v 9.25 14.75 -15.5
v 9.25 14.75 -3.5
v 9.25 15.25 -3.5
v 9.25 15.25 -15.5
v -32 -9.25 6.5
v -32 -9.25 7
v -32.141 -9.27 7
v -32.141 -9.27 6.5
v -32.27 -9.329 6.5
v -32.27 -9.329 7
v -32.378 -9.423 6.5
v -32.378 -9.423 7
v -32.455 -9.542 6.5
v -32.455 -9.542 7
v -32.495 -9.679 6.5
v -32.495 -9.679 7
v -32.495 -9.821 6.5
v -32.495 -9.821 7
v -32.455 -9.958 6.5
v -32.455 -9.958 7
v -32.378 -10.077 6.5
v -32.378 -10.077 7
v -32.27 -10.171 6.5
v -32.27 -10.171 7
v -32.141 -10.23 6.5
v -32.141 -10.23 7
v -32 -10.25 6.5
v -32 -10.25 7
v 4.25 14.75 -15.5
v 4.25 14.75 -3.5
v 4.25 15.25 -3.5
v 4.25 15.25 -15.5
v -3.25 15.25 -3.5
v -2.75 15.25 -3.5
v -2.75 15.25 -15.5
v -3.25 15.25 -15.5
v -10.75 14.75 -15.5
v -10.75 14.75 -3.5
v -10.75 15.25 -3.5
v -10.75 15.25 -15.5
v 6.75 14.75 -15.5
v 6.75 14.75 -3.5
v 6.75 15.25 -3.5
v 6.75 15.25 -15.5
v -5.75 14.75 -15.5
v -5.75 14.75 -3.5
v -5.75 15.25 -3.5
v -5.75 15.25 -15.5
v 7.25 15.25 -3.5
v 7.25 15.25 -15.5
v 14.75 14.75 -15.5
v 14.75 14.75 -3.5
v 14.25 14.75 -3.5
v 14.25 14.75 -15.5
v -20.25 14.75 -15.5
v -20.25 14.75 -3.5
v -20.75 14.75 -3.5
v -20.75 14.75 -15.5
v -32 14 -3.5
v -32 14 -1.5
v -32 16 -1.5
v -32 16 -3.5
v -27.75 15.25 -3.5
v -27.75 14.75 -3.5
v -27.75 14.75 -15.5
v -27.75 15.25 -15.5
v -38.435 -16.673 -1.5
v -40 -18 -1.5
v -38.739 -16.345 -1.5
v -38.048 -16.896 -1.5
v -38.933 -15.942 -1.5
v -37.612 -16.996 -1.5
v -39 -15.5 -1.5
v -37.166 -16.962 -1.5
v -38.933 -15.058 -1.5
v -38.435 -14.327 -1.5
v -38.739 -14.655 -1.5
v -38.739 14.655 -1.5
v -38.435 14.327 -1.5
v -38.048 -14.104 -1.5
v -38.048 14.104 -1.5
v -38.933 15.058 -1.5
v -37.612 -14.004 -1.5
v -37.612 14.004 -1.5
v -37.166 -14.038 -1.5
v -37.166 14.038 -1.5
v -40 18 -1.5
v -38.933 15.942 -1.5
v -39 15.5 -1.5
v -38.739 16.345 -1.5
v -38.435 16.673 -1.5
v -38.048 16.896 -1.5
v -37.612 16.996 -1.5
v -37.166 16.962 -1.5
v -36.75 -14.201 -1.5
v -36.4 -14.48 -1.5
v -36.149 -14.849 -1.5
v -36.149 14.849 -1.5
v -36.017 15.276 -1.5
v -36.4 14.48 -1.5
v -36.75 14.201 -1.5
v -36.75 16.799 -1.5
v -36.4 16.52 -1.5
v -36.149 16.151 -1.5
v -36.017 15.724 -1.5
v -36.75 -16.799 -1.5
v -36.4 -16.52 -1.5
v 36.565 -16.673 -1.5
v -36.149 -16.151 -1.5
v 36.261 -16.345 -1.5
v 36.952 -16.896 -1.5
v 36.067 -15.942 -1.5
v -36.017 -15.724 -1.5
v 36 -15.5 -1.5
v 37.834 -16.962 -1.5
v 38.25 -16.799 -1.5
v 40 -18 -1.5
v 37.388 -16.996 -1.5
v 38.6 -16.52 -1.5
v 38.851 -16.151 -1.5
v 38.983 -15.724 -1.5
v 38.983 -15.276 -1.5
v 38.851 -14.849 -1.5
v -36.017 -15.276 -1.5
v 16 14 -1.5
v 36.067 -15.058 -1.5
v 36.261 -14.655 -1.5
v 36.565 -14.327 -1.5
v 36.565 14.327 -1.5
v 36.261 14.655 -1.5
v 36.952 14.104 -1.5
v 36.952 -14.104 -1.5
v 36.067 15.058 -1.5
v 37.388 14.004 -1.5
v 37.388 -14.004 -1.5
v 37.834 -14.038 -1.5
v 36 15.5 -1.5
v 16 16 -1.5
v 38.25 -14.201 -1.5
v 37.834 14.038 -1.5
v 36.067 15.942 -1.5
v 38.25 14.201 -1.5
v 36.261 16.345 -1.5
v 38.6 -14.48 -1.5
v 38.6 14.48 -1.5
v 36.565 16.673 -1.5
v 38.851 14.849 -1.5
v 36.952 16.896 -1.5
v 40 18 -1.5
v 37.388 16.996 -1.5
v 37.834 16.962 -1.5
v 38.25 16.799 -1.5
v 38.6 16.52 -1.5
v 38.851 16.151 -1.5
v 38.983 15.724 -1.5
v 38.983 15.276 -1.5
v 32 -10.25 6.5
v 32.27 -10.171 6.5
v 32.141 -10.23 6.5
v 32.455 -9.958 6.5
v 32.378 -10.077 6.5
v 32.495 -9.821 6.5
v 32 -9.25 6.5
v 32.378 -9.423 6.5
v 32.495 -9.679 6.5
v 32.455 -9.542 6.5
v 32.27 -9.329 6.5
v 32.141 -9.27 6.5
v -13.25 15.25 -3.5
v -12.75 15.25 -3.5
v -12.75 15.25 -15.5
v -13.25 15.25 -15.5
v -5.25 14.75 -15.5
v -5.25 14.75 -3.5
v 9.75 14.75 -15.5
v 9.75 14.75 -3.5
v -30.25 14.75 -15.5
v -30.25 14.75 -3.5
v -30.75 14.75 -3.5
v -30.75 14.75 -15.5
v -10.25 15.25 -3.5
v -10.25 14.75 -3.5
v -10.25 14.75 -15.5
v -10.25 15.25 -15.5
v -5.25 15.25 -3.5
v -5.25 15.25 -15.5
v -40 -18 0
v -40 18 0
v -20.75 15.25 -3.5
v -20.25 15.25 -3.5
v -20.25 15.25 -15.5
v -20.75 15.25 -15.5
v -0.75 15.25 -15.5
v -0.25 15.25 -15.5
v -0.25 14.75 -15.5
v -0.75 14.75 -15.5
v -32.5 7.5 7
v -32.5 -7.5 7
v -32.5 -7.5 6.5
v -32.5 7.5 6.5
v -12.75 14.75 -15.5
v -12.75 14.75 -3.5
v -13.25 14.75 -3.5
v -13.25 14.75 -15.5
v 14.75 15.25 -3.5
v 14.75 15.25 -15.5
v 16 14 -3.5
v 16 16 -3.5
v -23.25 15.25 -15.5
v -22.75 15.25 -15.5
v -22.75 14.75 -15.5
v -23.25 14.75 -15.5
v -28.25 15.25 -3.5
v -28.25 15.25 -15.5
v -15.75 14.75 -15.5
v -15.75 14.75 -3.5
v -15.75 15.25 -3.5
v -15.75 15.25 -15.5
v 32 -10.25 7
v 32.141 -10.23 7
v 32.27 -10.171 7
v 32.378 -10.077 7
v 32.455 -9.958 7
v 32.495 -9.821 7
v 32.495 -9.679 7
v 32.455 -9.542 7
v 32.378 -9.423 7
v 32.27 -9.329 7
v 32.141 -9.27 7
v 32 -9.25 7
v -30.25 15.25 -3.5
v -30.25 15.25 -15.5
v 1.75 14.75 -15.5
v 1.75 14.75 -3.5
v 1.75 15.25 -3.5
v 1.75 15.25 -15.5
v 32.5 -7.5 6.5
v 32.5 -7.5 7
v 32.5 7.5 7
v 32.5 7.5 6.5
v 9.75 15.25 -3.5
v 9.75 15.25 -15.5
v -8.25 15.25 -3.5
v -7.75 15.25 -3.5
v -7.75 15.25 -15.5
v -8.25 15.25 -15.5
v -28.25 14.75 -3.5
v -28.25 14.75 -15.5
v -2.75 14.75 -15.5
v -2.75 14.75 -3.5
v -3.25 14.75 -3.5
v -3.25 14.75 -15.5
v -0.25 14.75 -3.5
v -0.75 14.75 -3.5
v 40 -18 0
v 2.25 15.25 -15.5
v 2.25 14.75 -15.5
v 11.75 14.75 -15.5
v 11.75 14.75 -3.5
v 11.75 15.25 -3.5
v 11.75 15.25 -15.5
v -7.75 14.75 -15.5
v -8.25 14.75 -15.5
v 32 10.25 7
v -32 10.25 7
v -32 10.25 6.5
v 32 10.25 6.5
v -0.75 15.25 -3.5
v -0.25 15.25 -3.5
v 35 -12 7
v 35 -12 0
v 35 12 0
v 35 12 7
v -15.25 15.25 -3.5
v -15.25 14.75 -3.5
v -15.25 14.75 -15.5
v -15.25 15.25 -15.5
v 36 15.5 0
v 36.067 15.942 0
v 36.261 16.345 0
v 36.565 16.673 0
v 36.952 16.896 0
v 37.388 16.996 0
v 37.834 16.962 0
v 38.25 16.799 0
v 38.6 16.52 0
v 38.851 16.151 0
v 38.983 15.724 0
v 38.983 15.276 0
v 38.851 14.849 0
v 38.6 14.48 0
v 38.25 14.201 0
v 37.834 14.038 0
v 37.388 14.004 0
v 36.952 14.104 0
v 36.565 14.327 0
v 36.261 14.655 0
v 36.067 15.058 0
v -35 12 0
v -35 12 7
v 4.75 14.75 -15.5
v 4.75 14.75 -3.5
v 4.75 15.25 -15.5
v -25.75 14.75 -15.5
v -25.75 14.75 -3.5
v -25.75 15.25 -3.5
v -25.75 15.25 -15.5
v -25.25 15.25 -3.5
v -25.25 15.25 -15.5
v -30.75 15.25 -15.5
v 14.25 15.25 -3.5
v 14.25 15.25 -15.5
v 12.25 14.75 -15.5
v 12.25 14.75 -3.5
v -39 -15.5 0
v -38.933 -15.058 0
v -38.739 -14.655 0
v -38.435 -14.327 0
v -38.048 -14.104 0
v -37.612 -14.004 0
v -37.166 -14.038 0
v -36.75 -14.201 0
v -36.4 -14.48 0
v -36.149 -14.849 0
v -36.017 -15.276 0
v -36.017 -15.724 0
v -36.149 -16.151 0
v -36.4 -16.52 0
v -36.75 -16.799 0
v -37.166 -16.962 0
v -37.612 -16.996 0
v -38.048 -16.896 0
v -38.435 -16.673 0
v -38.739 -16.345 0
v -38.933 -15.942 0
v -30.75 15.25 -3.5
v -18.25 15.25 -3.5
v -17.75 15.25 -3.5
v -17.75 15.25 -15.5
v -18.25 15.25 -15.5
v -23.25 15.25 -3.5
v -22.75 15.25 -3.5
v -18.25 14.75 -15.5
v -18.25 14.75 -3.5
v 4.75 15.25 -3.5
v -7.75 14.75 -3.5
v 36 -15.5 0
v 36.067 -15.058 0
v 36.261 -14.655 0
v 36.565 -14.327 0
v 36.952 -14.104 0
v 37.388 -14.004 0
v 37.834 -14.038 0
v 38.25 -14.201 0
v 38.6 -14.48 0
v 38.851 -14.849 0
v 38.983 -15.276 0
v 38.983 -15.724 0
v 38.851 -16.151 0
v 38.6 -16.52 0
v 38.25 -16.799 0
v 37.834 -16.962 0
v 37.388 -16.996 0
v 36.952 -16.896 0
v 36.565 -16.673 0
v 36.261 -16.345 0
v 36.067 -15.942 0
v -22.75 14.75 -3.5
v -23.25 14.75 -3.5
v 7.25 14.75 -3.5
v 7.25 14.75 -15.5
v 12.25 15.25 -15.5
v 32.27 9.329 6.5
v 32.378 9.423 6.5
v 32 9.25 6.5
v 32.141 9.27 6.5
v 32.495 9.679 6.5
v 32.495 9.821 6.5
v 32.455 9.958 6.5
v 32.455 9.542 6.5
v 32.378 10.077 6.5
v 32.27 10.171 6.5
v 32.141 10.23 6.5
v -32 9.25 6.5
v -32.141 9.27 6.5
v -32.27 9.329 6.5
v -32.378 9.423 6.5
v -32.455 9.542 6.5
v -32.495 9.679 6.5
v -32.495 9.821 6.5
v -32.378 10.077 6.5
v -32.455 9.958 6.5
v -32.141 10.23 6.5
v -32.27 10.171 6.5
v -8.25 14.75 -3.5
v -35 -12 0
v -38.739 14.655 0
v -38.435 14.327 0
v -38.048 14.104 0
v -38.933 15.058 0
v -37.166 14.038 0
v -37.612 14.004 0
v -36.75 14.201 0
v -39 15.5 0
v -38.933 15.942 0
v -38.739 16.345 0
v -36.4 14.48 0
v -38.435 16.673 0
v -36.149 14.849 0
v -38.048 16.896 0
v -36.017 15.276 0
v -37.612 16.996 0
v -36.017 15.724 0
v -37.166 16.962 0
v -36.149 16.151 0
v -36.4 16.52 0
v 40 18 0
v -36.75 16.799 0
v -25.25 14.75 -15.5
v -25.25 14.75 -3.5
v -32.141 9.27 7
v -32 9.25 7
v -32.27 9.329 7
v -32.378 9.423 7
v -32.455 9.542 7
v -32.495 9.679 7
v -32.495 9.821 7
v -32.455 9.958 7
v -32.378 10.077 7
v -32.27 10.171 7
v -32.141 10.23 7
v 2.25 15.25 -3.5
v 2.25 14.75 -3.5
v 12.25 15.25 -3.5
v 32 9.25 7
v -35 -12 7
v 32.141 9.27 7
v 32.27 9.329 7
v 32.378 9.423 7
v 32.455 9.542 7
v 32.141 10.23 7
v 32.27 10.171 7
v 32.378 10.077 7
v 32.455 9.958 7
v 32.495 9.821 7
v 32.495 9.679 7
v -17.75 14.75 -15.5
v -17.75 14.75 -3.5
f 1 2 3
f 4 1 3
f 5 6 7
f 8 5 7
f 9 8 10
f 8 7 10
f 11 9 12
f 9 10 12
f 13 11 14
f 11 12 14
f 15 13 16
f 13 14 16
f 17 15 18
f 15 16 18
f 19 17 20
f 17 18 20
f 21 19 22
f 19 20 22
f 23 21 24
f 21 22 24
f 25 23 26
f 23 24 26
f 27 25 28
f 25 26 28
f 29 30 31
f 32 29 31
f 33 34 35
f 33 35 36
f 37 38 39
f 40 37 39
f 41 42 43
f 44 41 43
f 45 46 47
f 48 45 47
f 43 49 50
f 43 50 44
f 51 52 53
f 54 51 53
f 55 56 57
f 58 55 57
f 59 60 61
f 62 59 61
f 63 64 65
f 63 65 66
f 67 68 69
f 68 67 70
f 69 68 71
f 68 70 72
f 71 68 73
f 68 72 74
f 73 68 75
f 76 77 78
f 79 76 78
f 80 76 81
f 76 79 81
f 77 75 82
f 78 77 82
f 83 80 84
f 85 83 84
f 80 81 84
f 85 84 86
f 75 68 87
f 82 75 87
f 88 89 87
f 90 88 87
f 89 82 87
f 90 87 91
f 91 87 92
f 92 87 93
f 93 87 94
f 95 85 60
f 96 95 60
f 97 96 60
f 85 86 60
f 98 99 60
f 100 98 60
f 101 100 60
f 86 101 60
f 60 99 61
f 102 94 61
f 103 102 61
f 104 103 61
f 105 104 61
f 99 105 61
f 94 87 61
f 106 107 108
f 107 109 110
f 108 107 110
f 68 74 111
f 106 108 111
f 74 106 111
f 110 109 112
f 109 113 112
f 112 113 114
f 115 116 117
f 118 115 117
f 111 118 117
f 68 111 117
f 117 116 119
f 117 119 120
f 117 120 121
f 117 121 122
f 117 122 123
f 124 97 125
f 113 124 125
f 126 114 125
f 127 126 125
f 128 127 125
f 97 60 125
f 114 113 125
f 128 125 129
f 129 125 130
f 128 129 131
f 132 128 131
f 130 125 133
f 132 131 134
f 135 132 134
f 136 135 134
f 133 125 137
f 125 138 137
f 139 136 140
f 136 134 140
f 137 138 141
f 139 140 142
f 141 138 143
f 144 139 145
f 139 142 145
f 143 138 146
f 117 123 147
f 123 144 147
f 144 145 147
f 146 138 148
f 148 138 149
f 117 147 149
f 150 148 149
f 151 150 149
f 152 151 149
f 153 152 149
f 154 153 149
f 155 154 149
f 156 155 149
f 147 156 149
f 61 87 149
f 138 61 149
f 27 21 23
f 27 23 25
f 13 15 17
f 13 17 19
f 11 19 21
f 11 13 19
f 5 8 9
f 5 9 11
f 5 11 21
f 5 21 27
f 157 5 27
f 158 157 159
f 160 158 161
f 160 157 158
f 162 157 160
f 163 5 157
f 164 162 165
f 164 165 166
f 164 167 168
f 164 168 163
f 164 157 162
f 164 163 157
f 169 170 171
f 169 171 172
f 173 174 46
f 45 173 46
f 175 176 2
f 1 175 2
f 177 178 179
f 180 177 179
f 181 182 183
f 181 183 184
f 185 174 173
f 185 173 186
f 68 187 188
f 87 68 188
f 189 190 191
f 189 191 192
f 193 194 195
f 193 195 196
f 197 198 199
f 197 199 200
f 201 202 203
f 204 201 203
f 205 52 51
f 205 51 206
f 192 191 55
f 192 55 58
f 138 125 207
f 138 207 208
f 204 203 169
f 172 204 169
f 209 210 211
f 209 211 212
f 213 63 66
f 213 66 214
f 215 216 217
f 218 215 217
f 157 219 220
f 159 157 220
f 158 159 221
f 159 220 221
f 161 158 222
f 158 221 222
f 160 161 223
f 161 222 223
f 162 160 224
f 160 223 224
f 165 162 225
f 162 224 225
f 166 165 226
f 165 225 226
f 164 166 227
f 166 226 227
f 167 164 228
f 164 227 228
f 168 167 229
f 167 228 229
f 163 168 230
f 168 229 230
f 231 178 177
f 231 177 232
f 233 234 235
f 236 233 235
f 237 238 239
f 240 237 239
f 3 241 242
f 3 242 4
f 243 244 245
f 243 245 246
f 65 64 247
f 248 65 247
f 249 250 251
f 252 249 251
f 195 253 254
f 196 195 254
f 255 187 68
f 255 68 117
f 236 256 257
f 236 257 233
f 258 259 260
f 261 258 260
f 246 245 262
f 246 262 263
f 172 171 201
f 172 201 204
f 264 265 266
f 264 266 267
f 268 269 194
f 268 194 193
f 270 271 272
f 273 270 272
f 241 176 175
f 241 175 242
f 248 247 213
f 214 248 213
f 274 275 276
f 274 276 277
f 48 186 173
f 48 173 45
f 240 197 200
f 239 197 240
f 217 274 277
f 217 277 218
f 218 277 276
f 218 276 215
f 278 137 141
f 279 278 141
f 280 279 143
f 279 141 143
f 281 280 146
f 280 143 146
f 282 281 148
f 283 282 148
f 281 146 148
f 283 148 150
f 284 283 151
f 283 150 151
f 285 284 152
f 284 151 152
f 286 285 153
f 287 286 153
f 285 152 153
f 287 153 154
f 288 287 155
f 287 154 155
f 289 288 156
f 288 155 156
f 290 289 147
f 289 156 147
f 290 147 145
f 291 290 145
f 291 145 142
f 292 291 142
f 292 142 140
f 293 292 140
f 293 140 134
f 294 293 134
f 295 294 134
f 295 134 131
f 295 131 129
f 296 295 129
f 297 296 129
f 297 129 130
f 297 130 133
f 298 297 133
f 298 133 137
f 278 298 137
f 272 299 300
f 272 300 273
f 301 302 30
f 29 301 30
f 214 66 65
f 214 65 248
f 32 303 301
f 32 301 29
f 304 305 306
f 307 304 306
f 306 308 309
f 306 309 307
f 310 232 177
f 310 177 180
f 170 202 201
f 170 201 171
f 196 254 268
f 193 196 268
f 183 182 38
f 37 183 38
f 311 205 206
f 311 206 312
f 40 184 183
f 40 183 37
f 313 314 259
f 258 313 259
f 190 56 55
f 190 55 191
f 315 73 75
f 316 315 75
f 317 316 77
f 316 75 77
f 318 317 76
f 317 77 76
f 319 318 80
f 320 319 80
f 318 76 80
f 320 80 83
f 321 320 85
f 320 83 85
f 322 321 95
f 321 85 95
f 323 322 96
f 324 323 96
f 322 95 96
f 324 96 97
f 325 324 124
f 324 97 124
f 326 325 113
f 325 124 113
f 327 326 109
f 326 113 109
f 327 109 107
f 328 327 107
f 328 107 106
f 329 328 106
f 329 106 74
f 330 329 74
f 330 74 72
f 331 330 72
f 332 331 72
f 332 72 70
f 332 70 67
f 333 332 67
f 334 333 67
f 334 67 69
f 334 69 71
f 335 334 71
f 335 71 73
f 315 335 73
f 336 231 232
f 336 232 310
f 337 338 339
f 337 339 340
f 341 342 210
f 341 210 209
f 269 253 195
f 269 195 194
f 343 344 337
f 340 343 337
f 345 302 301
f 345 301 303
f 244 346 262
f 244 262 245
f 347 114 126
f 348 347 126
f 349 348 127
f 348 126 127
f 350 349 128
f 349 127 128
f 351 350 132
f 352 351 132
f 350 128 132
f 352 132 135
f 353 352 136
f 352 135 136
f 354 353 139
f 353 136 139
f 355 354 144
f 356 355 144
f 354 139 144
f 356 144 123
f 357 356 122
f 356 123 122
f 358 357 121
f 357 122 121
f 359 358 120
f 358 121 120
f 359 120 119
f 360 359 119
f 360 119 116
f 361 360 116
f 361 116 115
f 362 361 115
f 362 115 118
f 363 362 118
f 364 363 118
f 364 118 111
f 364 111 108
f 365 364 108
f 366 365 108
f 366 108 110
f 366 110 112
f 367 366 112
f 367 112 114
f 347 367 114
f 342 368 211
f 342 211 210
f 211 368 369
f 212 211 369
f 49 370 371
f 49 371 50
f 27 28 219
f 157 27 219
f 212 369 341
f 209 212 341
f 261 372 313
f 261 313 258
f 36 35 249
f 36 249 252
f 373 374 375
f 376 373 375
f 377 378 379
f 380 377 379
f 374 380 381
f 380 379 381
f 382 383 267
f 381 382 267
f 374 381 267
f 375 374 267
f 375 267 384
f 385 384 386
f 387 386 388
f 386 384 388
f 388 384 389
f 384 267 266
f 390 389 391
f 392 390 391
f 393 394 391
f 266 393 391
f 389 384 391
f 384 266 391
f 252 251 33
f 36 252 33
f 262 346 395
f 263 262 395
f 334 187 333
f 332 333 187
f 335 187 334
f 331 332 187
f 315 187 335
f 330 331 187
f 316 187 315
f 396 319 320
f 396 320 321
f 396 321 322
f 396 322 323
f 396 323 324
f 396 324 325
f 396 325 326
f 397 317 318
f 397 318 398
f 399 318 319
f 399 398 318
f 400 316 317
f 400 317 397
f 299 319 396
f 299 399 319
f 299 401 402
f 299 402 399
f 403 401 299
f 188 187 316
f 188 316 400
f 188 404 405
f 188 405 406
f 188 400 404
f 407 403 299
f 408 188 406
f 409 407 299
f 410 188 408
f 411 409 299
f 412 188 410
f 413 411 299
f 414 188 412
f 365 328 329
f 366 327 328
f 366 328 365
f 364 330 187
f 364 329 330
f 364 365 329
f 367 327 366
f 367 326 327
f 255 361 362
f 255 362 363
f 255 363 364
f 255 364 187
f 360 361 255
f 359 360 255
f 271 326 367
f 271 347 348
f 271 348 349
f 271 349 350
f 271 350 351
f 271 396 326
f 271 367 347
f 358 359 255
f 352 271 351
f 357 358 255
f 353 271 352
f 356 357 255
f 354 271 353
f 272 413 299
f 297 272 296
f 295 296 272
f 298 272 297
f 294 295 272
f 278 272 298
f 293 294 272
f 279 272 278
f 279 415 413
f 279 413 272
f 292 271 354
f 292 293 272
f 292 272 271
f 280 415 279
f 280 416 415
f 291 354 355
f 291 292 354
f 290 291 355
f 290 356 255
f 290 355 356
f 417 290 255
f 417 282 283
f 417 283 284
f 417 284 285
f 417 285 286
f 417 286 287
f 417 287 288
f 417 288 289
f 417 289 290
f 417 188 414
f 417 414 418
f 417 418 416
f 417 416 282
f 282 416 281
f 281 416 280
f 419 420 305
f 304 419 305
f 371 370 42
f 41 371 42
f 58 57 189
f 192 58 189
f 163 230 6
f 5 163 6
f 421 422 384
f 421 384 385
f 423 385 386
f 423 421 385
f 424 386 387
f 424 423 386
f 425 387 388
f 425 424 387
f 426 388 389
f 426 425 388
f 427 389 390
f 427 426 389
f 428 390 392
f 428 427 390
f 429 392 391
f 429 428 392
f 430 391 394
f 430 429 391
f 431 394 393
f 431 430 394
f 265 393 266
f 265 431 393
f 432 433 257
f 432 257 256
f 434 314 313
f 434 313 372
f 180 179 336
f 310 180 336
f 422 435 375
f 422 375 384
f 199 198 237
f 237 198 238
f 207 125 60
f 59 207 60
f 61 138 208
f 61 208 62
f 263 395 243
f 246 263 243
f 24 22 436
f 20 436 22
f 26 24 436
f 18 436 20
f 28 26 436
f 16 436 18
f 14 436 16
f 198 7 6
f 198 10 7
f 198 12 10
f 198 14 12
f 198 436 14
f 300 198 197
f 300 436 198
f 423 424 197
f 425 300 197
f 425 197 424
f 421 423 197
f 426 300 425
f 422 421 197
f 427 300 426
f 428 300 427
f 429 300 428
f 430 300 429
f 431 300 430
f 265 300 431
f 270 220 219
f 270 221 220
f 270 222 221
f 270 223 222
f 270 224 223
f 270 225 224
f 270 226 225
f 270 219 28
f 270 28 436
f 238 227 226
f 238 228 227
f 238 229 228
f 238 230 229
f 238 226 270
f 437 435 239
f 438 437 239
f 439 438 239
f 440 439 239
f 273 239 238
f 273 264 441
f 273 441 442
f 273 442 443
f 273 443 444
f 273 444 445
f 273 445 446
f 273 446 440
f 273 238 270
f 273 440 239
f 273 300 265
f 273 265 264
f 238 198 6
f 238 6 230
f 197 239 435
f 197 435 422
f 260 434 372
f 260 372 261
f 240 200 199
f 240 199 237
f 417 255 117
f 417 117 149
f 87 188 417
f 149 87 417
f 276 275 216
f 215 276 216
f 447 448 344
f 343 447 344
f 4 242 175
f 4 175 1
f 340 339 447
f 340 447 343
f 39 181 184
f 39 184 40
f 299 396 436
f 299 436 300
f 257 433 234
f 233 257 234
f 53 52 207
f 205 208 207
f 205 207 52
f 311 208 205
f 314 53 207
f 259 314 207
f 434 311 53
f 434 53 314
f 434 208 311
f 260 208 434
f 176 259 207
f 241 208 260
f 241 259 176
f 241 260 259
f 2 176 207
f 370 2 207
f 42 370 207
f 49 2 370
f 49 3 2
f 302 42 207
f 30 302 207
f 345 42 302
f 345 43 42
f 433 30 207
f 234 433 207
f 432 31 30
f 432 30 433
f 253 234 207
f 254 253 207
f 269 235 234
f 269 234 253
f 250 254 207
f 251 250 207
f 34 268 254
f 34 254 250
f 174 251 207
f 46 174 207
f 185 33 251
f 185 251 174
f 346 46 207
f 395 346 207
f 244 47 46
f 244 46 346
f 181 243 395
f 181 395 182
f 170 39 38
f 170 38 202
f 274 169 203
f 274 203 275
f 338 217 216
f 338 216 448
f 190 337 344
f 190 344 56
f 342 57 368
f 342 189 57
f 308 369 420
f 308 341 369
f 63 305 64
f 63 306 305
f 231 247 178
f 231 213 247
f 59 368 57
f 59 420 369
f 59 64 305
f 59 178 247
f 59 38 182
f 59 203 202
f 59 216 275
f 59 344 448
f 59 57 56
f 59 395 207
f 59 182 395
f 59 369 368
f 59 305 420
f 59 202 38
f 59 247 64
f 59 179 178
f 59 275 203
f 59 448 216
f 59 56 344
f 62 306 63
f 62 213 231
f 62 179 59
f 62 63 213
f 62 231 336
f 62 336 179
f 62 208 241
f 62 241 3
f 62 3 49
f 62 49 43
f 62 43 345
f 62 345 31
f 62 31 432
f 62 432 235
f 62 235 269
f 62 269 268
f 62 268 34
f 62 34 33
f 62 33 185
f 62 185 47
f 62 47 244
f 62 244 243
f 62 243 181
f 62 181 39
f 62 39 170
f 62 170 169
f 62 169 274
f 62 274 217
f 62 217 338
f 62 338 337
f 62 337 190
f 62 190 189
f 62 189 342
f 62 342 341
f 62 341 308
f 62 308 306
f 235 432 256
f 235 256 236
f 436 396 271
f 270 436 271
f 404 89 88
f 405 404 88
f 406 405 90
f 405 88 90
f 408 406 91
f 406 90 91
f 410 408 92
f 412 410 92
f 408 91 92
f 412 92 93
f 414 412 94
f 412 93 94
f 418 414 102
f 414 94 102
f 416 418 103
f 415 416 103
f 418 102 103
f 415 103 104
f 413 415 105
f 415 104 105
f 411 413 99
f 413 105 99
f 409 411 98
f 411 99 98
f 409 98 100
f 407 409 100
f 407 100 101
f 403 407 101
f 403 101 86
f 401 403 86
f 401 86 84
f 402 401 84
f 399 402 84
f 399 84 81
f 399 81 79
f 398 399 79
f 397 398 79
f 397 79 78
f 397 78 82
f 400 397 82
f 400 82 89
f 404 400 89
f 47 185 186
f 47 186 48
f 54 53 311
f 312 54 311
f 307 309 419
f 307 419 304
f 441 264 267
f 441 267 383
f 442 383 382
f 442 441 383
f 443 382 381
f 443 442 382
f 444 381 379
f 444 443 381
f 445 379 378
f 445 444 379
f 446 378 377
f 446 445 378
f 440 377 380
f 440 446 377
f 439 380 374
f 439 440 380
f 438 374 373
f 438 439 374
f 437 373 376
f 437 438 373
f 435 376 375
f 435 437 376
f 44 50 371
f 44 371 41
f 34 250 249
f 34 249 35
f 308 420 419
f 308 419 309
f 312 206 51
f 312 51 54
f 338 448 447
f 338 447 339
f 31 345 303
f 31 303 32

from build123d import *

# Parameters (mm, degrees)
SKETCH1_W           = 80
SKETCH1_H           = 36
BASE_FLANGE1_DEPTH  = 1.5
SKETCH6_W           = 70
SKETCH6_H           = 24
BOSS_EXTRUDE1_DEPTH = 7
SKETCH7_W           = 65
SKETCH7_H           = 15
CUT_EXTRUDE1_DEPTH  = 0.5
CUT_EXTRUDE2_DEPTH  = 0.5
CUT_EXTRUDE3_REACH  = 46.679
SKETCH9_R           = 1.5
SKETCH10_W          = 48
SKETCH10_H          = 2
BOSS_EXTRUDE2_DEPTH = 2
SKETCH11_W          = 0.5
SKETCH11_H          = 0.5
BOSS_EXTRUDE3_DEPTH = 12
LPATTERN1_COUNT     = 19
LPATTERN1_PITCH     = 2.5


# Sheet-metal steps are written as plain solids
with BuildPart() as part:
    # Sketch1 → Base-Flange1 (new body)
    with BuildSketch(Plane.XY):
        Rectangle(SKETCH1_W, SKETCH1_H)
    extrude(amount=-BASE_FLANGE1_DEPTH)

    # Sketch6 → Boss-Extrude1 (add)
    with BuildSketch(Plane.XY):
        Rectangle(SKETCH6_W, SKETCH6_H)
    extrude(amount=BOSS_EXTRUDE1_DEPTH)

    # Sketch7 → Cut-Extrude1 (cut)
    with BuildSketch(Plane.XY.offset(7)):
        Rectangle(SKETCH7_W, SKETCH7_H)
    extrude(amount=-CUT_EXTRUDE1_DEPTH, mode=Mode.SUBTRACT)

    # Sketch8 → Cut-Extrude2 (cut)
    with BuildSketch(Plane.XY.offset(7)):
        with BuildLine():
            Line((32, 9.25), (-32, 9.25))
            ThreePointArc((-32, 9.25), (-32.5, 9.75), (-32, 10.25))
            Line((-32, 10.25), (32, 10.25))
            ThreePointArc((32, 10.25), (32.5, 9.75), (32, 9.25))
        make_face()
        with BuildLine():
            Line((32, -9.25), (-32, -9.25))
            ThreePointArc((-32, -9.25), (-32.5, -9.75), (-32, -10.25))
            Line((-32, -10.25), (32, -10.25))
            ThreePointArc((32, -10.25), (32.5, -9.75), (32, -9.25))
        make_face()
    extrude(amount=-CUT_EXTRUDE2_DEPTH, mode=Mode.SUBTRACT)

    # Sketch9 → Cut-Extrude3 (cut, up to next)
    with BuildSketch(Plane(origin=(0, 0, -1.5), x_dir=(-1, 0, 0), z_dir=(0, 0, -1)), mode=Mode.PRIVATE) as cut_extrude3_sk1:
        with Locations((-37.5, 15.5)):
            Circle(SKETCH9_R)
    cut_extrude3_tool1 = extrude(cut_extrude3_sk1.sketch, amount=-CUT_EXTRUDE3_REACH, mode=Mode.PRIVATE) & part.part
    # Sketch9 → Cut-Extrude3 (cut, up to next)
    with BuildSketch(Plane(origin=(0, 0, -1.5), x_dir=(-1, 0, 0), z_dir=(0, 0, -1)), mode=Mode.PRIVATE) as cut_extrude3_sk2:
        with Locations((-37.5, -15.5)):
            Circle(SKETCH9_R)
    cut_extrude3_tool2 = extrude(cut_extrude3_sk2.sketch, amount=-CUT_EXTRUDE3_REACH, mode=Mode.PRIVATE) & part.part
    # Sketch9 → Cut-Extrude3 (cut, up to next)
    with BuildSketch(Plane(origin=(0, 0, -1.5), x_dir=(-1, 0, 0), z_dir=(0, 0, -1)), mode=Mode.PRIVATE) as cut_extrude3_sk3:
        with Locations((37.5, 15.5)):
            Circle(SKETCH9_R)
    cut_extrude3_tool3 = extrude(cut_extrude3_sk3.sketch, amount=-CUT_EXTRUDE3_REACH, mode=Mode.PRIVATE) & part.part
    # Sketch9 → Cut-Extrude3 (cut, up to next)
    with BuildSketch(Plane(origin=(0, 0, -1.5), x_dir=(-1, 0, 0), z_dir=(0, 0, -1)), mode=Mode.PRIVATE) as cut_extrude3_sk4:
        with Locations((37.5, -15.5)):
            Circle(SKETCH9_R)
    cut_extrude3_tool4 = extrude(cut_extrude3_sk4.sketch, amount=-CUT_EXTRUDE3_REACH, mode=Mode.PRIVATE) & part.part
    add(cut_extrude3_tool1.solids().sort_by_distance((37.5, 15.5, -1.5))[0], mode=Mode.SUBTRACT)
    add(cut_extrude3_tool2.solids().sort_by_distance((37.5, -15.5, -1.5))[0], mode=Mode.SUBTRACT)
    add(cut_extrude3_tool3.solids().sort_by_distance((-37.5, 15.5, -1.5))[0], mode=Mode.SUBTRACT)
    add(cut_extrude3_tool4.solids().sort_by_distance((-37.5, -15.5, -1.5))[0], mode=Mode.SUBTRACT)

    # Sketch10 → Boss-Extrude2 (add)
    with BuildSketch(Plane(origin=(0, 0, -1.5), x_dir=(-1, 0, 0), z_dir=(0, 0, -1))):
        with Locations((8, 15)):
            Rectangle(SKETCH10_W, SKETCH10_H)
    extrude(amount=BOSS_EXTRUDE2_DEPTH)

    # Sketch11 → Boss-Extrude3 (add)
    with BuildSketch(Plane(origin=(0, 0, -3.5), x_dir=(-1, 0, 0), z_dir=(0, 0, -1))):
        with Locations((30.5, 15)):
            Rectangle(SKETCH11_W, SKETCH11_H)
    boss_extrude3 = extrude(amount=BOSS_EXTRUDE3_DEPTH)

    # LPattern1: Boss-Extrude3 ×19
    with Locations(*[(i * LPATTERN1_PITCH, 0, 0) for i in range(1, LPATTERN1_COUNT)]):
        add(boss_extrude3)


solid = part.part
